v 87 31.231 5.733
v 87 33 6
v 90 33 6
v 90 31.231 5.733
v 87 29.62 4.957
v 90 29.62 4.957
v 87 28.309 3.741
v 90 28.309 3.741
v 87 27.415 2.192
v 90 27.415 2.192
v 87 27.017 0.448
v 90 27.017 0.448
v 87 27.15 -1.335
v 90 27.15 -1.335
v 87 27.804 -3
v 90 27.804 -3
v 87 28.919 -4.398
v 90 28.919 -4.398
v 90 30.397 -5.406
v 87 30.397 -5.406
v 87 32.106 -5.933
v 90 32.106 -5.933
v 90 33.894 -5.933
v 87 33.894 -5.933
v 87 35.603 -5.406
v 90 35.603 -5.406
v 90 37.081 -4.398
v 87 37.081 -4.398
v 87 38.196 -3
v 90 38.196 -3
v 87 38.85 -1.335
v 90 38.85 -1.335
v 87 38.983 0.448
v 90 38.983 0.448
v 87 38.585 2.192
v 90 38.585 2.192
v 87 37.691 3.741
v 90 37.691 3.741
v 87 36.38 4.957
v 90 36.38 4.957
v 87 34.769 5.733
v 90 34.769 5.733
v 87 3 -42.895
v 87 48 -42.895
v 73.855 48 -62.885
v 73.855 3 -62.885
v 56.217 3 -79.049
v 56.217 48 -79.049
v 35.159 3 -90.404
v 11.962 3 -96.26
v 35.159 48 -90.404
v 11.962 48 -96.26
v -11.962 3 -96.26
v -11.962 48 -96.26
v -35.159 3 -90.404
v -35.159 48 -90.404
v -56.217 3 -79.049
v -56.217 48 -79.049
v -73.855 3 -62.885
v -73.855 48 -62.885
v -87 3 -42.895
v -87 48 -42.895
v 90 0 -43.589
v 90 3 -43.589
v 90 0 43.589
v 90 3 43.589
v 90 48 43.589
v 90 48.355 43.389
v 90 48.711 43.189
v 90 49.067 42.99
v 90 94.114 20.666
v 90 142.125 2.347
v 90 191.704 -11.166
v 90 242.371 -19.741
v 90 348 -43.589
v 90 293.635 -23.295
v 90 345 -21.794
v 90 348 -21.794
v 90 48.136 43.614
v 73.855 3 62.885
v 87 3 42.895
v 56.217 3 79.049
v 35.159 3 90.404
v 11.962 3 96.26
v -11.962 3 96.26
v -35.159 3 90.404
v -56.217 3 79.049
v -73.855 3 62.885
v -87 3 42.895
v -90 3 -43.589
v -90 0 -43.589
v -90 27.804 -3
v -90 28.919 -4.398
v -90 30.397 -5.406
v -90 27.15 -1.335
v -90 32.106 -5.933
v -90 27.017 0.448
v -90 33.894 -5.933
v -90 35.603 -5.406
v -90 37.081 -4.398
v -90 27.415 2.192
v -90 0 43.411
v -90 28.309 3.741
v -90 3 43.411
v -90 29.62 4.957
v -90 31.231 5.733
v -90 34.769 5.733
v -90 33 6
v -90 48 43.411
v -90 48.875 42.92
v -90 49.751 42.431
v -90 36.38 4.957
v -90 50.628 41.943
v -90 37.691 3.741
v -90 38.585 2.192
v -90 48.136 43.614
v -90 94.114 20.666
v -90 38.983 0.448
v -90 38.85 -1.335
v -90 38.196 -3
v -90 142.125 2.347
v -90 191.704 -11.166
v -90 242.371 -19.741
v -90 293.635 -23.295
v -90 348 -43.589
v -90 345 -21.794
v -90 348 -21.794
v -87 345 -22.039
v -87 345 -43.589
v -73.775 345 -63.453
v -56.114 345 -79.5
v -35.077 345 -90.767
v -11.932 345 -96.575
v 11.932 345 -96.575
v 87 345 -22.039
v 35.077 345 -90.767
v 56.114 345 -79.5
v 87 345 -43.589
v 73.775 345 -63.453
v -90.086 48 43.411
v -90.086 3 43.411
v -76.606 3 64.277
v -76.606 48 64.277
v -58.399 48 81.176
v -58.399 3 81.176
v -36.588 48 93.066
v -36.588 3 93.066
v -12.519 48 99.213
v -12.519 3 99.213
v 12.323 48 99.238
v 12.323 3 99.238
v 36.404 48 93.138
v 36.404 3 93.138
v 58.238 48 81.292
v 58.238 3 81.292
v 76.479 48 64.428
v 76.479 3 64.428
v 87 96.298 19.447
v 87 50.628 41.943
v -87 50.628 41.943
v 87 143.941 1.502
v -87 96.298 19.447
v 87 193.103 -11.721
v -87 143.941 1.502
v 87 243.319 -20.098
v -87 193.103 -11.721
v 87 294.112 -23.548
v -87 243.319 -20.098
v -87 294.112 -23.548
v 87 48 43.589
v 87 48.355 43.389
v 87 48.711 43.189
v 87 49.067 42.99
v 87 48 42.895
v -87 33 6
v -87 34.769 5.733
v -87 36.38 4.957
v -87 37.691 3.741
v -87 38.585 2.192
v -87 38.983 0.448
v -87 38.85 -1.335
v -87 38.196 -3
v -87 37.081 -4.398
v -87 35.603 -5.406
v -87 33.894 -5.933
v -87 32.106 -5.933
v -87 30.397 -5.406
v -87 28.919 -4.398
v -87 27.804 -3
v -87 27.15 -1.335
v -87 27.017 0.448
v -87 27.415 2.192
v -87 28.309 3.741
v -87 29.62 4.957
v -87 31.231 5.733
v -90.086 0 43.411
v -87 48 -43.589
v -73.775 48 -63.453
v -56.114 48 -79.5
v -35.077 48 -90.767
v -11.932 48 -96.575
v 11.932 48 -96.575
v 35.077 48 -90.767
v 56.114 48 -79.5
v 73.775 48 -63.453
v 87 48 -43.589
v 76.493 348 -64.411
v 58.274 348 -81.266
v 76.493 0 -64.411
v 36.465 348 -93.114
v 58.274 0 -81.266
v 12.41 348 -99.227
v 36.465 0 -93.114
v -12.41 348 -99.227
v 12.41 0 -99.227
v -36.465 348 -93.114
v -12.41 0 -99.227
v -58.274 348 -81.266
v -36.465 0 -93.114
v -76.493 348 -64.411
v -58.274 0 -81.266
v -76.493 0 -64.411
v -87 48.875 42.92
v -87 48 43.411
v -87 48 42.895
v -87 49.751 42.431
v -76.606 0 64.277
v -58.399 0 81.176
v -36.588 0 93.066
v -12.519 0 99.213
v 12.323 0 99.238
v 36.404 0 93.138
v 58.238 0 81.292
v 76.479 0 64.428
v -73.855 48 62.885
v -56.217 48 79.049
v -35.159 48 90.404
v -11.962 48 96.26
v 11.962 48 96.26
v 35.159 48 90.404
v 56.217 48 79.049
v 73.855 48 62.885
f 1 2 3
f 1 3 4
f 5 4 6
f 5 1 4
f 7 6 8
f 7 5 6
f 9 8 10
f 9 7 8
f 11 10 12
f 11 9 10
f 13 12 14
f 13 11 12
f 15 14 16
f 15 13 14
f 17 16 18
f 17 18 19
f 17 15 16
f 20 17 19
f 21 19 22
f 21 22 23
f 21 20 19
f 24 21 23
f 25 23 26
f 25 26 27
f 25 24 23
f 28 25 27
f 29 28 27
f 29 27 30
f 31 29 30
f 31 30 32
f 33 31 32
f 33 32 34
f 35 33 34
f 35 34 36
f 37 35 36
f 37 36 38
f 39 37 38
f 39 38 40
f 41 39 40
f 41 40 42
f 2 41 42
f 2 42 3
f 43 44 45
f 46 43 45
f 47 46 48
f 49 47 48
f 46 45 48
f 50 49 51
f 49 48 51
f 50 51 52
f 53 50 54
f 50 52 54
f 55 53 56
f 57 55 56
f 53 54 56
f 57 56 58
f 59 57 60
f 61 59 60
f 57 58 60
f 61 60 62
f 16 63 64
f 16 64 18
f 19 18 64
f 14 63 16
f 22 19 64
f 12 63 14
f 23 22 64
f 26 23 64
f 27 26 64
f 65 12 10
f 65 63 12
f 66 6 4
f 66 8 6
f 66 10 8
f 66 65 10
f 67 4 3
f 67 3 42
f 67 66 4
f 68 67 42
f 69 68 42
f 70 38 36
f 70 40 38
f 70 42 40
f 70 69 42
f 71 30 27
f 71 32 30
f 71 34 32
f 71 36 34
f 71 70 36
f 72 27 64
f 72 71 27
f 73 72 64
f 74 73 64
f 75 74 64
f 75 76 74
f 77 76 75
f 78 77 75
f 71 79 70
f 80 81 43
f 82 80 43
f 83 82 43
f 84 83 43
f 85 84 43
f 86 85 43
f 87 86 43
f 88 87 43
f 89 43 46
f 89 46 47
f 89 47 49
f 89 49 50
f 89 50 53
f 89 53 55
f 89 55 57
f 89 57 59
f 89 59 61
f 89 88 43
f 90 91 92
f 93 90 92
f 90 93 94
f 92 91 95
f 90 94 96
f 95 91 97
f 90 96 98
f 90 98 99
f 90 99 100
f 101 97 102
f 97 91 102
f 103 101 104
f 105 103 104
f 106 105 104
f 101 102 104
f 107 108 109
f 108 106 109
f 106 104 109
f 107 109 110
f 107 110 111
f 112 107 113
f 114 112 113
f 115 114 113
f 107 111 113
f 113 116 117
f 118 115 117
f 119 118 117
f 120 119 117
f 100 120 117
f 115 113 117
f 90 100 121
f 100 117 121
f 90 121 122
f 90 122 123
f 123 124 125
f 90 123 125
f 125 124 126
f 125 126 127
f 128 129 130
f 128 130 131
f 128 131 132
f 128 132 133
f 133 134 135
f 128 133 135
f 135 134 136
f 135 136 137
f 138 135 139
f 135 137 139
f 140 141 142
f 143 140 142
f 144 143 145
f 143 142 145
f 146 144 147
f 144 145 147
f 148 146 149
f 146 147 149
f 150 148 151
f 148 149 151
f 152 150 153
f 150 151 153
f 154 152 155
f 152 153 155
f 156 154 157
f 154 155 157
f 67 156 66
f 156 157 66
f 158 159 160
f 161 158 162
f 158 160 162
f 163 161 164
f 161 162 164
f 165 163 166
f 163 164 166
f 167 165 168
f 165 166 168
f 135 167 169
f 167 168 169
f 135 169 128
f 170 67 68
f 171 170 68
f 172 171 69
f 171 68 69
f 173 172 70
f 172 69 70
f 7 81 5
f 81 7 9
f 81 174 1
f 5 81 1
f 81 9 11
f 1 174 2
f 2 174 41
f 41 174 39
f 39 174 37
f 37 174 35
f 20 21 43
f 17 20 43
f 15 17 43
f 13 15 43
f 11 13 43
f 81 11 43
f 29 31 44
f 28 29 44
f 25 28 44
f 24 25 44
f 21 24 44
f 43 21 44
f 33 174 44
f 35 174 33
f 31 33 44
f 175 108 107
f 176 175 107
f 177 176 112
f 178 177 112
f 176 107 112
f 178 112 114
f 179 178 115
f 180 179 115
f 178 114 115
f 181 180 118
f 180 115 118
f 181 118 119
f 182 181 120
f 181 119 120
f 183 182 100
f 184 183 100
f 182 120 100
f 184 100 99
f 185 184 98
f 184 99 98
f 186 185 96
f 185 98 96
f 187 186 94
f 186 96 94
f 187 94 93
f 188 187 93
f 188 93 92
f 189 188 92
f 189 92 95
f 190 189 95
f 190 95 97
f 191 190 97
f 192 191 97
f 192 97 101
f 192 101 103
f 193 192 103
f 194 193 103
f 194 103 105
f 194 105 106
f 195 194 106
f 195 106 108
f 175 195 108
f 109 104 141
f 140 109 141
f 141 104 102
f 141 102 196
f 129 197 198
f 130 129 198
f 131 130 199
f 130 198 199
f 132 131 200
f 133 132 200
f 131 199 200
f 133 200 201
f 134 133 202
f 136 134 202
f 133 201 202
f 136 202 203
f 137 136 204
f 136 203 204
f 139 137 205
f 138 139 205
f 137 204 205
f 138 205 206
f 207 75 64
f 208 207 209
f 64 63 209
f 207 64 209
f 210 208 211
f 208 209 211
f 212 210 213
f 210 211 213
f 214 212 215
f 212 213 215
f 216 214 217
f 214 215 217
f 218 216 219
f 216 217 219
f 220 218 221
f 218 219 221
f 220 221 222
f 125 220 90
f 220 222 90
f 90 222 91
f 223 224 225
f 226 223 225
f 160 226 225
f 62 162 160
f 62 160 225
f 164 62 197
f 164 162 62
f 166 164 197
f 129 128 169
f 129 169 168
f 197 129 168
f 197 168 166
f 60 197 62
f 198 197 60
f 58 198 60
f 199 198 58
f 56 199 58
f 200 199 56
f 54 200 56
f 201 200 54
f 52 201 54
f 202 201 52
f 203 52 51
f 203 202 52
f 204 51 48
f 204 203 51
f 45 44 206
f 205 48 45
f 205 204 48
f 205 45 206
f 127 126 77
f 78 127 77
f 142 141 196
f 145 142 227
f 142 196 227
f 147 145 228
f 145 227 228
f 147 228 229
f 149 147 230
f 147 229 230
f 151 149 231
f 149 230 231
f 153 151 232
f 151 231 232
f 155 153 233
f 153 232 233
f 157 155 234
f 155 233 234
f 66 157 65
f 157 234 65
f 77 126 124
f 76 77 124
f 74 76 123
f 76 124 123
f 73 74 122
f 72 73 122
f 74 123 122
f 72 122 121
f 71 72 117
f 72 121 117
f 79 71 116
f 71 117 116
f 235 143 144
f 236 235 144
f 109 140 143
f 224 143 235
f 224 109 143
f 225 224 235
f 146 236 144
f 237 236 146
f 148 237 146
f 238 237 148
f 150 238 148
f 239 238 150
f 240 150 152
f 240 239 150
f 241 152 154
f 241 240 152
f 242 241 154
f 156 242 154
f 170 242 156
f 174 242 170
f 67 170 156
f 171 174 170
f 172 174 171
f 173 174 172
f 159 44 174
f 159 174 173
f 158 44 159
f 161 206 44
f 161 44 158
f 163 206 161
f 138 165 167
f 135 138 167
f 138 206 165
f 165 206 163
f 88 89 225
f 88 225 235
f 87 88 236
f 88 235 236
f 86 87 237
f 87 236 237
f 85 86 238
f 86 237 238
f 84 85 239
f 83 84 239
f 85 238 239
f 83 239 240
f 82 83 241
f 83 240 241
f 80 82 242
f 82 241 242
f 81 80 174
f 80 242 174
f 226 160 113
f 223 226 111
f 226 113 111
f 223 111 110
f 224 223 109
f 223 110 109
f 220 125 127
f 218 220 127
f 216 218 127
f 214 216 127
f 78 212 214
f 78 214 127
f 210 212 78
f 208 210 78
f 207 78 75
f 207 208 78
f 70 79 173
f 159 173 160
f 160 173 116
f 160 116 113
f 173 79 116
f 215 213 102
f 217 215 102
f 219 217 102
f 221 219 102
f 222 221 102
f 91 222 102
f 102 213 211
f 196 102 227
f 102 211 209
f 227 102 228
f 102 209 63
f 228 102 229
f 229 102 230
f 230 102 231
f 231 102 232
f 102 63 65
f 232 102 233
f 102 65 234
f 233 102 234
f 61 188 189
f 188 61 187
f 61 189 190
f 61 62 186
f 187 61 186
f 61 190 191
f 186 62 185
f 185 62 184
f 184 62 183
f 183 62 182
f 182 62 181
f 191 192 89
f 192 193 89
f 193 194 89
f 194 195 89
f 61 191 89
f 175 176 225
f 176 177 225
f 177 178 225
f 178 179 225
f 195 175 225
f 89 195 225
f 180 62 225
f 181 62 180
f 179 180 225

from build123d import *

# Parameters (mm, degrees)
SKETCH1_R            = 100
BOSS_EXTRUDE2_DEPTH  = 3
SKETCH5_W            = 3
SKETCH5_H            = 87
BOSS_EXTRUDE5_DEPTH  = 45
SKETCH8_W            = 3
SKETCH8_H            = 87
BOSS_EXTRUDE6_DEPTH  = 45
SKETCH9_W            = 23.719660605
SKETCH9_H            = 94.301811056
CUT_EXTRUDE2_DEPTH   = 45
SKETCH10_W           = 23.969699351
SKETCH10_H           = 92.447375273
CUT_EXTRUDE3_DEPTH   = 45
SKETCH11_R           = 6
CUT_EXTRUDE4_DEPTH   = 45
CUT_EXTRUDE5_START   = -45
SKETCH12_R           = 6
CUT_EXTRUDE5_DEPTH   = 45
BOSS_EXTRUDE7_DEPTH  = 45
CUT_EXTRUDE6_DEPTH   = 45
BOSS_EXTRUDE8_DEPTH  = 3
BOSS_EXTRUDE10_DEPTH = 3
SWEEP1_START         = 48
SWEEP1_DEPTH         = 300
BOSS_EXTRUDE11_START = -3
BOSS_EXTRUDE11_DEPTH = 3
SWEEP2_START         = -90
SWEEP2_DEPTH         = 180


# Read off the part's stored shape, not the designer's step: Sweep1, Sweep2
with BuildPart() as part:
    # Sketch1 → Boss-Extrude2 (new body)
    with BuildSketch(Plane(origin=(0, 0, 0), x_dir=(1, 0, 0), z_dir=(0, 1, 0))):
        with Locations(Location((0, 0, 0), (0, 0, 270))):
            Circle(SKETCH1_R)
    extrude(amount=BOSS_EXTRUDE2_DEPTH)

    # Sketch5 → Boss-Extrude5 (add)
    with BuildSketch(Plane(origin=(0, 3, 0), x_dir=(1, 0, 0), z_dir=(0, 1, 0))):
        with Locations((88.5, 0.088989435)):
            Rectangle(SKETCH5_W, SKETCH5_H)
    extrude(amount=BOSS_EXTRUDE5_DEPTH)

    # Sketch8 → Boss-Extrude6 (add)
    with BuildSketch(Plane(origin=(0, 3, 0), x_dir=(1, 0, 0), z_dir=(0, 1, 0))):
        with Locations((-88.5, 0.088989435)):
            Rectangle(SKETCH8_W, SKETCH8_H)
    extrude(amount=BOSS_EXTRUDE6_DEPTH)

    # Sketch9 → Cut-Extrude2 (cut)
    with BuildSketch(Plane(origin=(0, 3, 0), x_dir=(1, 0, 0), z_dir=(0, 1, 0))):
        with Locations((101.859830303, -3.561916093)):
            Rectangle(SKETCH9_W, SKETCH9_H)
    extrude(amount=-CUT_EXTRUDE2_DEPTH, mode=Mode.SUBTRACT)

    # Sketch10 → Cut-Extrude3 (cut)
    with BuildSketch(Plane(origin=(0, 3, 0), x_dir=(1, 0, 0), z_dir=(0, 1, 0))):
        with Locations((-101.984849676, 2.812677071)):
            Rectangle(SKETCH10_W, SKETCH10_H)
    extrude(amount=-CUT_EXTRUDE3_DEPTH, mode=Mode.SUBTRACT)

    # Sketch11 → Cut-Extrude4 (cut)
    with BuildSketch(Plane.ZY.offset(90)):
        with Locations((0, 33)):
            Circle(SKETCH11_R)
    extrude(amount=-CUT_EXTRUDE4_DEPTH, mode=Mode.SUBTRACT)

    # Sketch12 → Cut-Extrude5 (cut)
    with BuildSketch(Plane(origin=(90, 0, 0), x_dir=(0, 0, -1), z_dir=(1, 0, 0)).offset(CUT_EXTRUDE5_START)):
        with Locations(Location((0, 33, 0), (0, 0, 180))):
            Circle(SKETCH12_R)
    extrude(amount=CUT_EXTRUDE5_DEPTH, mode=Mode.SUBTRACT)

    # Sketch14 → Boss-Extrude7 (add)
    with BuildSketch(Plane(origin=(0, 3, 0), x_dir=(1, 0, 0), z_dir=(0, 1, 0))):
        with BuildLine():
            Line((-90, -43.411010565), (-90.085982049, -43.411010565))
            ThreePointArc((-90.085982049, -43.411010565), (-0.098829893, -99.999951163), (90, -43.588989435))
            Line((90, -43.588989435), (90, -43.411010565))
            Line((90, -43.411010565), (87, -43.411010565))
            Line((87, -43.411010565), (87, 43.588989435))
            Line((87, 43.588989435), (90, 43.588989435))
            ThreePointArc((90, 43.588989435), (0, 100), (-90, 43.588989435))
            Line((-90, 43.588989435), (-87, 43.588989435))
            Line((-87, 43.588989435), (-87, -43.411010565))
            Line((-87, -43.411010565), (-90, -43.411010565))
        make_face()
    extrude(amount=BOSS_EXTRUDE7_DEPTH)

    # 3DSketch1 → Cut-Extrude6 (cut)
    with BuildSketch(Plane(origin=(-87, 48, -42.895221179), x_dir=(0.8969072164948455, 0, 0.4422187750417981), z_dir=(0, -1, 0))):
        with BuildLine():
            Line((0, 0), (37.93814433, 76.946066857))
            ThreePointArc((37.93814433, 76.946066857), (139.895221179, 87), (194, 0))
            Line((194, 0), (156.06185567, -76.946066857))
            ThreePointArc((156.06185567, -76.946066857), (54.104778821, -87), (0, 0))
        make_face()
    extrude(amount=CUT_EXTRUDE6_DEPTH, mode=Mode.SUBTRACT)

    # Sketch17 → Boss-Extrude8 (add)
    with BuildSketch(Plane(origin=(90, 0, 0), x_dir=(0, 0, -1), z_dir=(1, 0, 0))):
        with BuildLine():
            Line((21.794494718, 348), (43.588989435, 348))
            Line((43.588989435, 348), (43.588989435, 48))
            Line((43.588989435, 48), (-43.588989435, 48))
            ThreePointArc((-43.588989435, 48), (11.635050375, 193.089199561), (21.794494718, 348))
        make_face()
    extrude(amount=-BOSS_EXTRUDE8_DEPTH)

    # Sketch21 → Boss-Extrude10 (add)
    with BuildSketch(Plane.ZY.offset(90)):
        with BuildLine():
            Line((43.411010565, 48), (-43.588989435, 48))
            Line((-43.588989435, 48), (-43.588989435, 348))
            Line((-43.588989435, 348), (-21.794494718, 348))
            ThreePointArc((-21.794494718, 348), (-11.721133915, 193.103198738), (43.411010565, 48))
        make_face()
    extrude(amount=-BOSS_EXTRUDE10_DEPTH)

    # Sweep1 outline → Sweep1 (add)
    with BuildSketch(Plane(origin=(0, 0, 0), x_dir=(1, 0, 0), z_dir=(0, 1, 0)).offset(SWEEP1_START)):
        with BuildLine():
            ThreePointArc((90, 43.588989435), (0, 100), (-90, 43.588989435))
            Line((-90, 43.588989435), (-87, 43.588989435))
            ThreePointArc((-87, 43.588989435), (0, 97.308786859), (87, 43.588989435))
            Line((87, 43.588989435), (90, 43.588989435))
        make_face()
    extrude(amount=SWEEP1_DEPTH)

    # Sketch26 → Boss-Extrude11 (add)
    with BuildSketch(Plane(origin=(0, 348, 0), x_dir=(1, 0, 0), z_dir=(0, 1, 0)).offset(BOSS_EXTRUDE11_START)):
        with BuildLine():
            Line((-90, 21.794494718), (90, 21.794494718))
            Line((90, 21.794494718), (90, 43.588989435))
            ThreePointArc((90, 43.588989435), (0, 100), (-90, 43.588989435))
            Line((-90, 43.588989435), (-90, 21.794494718))
        make_face()
    extrude(amount=BOSS_EXTRUDE11_DEPTH)

    # Sweep2 outline → Sweep2 (add)
    with BuildSketch(Plane.YZ.offset(SWEEP2_START)):
        with BuildLine():
            ThreePointArc((50.627921058, 41.94345394), (193.103198738, -11.721133915), (345, -22.038813222))
            Line((345, -22.038813222), (345, -21.794494718))
            ThreePointArc((345, -21.794494718), (191.70412896, -11.165627984), (48.136044185, 43.613947774))
            Line((48.136044185, 43.613947774), (50.627921058, 41.94345394))
        make_face()
    extrude(amount=SWEEP2_DEPTH)


solid = part.part
